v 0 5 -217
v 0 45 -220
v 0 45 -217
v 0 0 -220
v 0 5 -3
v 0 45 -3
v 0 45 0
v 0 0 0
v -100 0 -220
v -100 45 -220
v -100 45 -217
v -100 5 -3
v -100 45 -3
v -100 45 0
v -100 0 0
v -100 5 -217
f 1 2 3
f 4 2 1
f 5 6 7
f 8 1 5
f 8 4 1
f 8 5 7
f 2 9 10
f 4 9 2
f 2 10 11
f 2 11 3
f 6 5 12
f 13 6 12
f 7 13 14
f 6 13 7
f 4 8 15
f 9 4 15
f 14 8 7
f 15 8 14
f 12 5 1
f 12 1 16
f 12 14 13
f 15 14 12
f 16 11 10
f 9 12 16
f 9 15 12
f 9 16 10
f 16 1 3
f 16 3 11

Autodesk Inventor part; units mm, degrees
ref_plane "YZ Plane" through (0, 0, 0) normal (1, 0, 0) x (0, 1, 0)
ref_plane "XZ Plane" through (0, 0, 0) normal (0, 1, 0) x (-1, 0, 0)
ref_plane "XY Plane" through (0, 0, 0) normal (0, 0, 1) x (1, 0, 0)
sketch "Sketch4" plane through (0, 0, 0) normal (0, 1, 0) x (-1, 0, 0)
  line L0 (0, 0) -> (100, 0)
  line L1 (100, 0) -> (100, -220)
  line L2 (100, -220) -> (0, -220)
  line L3 (0, -220) -> (0, 0)
  dimension "d12" = 100
  dimension "d13" = 220
extrude "Extrusion4" add sketch "Sketch4" along normal blind 5
sketch "Sketch5" plane through (0, 5, 0) normal (0, 1, 0) x (1, 0, 0)
  line L0 (-100, 220) -> (-100, 0) projected
  line L1 (-100, 0) -> (0, 0)
  line L2 (0, 0) -> (0, 3)
  line L3 (0, 3) -> (-100, 3)
  line L4 (-100, 3) -> (-100, 0)
  line L5 (-100, 220) -> (0, 220)
  line L6 (0, 220) -> (0, 217)
  line L7 (0, 217) -> (-100, 217)
  line L8 (-100, 217) -> (-100, 220)
  point P0 (0, 0)
  point P1 (-100, 217)
  dimension "d16" = 100
  dimension "d17" = 3
  dimension "d18" = 100
  dimension "d19" = 3
extrude "Extrusion5" add sketch "Sketch5" along normal blind 40
properties part number "1P10 DP3 pi holder"
